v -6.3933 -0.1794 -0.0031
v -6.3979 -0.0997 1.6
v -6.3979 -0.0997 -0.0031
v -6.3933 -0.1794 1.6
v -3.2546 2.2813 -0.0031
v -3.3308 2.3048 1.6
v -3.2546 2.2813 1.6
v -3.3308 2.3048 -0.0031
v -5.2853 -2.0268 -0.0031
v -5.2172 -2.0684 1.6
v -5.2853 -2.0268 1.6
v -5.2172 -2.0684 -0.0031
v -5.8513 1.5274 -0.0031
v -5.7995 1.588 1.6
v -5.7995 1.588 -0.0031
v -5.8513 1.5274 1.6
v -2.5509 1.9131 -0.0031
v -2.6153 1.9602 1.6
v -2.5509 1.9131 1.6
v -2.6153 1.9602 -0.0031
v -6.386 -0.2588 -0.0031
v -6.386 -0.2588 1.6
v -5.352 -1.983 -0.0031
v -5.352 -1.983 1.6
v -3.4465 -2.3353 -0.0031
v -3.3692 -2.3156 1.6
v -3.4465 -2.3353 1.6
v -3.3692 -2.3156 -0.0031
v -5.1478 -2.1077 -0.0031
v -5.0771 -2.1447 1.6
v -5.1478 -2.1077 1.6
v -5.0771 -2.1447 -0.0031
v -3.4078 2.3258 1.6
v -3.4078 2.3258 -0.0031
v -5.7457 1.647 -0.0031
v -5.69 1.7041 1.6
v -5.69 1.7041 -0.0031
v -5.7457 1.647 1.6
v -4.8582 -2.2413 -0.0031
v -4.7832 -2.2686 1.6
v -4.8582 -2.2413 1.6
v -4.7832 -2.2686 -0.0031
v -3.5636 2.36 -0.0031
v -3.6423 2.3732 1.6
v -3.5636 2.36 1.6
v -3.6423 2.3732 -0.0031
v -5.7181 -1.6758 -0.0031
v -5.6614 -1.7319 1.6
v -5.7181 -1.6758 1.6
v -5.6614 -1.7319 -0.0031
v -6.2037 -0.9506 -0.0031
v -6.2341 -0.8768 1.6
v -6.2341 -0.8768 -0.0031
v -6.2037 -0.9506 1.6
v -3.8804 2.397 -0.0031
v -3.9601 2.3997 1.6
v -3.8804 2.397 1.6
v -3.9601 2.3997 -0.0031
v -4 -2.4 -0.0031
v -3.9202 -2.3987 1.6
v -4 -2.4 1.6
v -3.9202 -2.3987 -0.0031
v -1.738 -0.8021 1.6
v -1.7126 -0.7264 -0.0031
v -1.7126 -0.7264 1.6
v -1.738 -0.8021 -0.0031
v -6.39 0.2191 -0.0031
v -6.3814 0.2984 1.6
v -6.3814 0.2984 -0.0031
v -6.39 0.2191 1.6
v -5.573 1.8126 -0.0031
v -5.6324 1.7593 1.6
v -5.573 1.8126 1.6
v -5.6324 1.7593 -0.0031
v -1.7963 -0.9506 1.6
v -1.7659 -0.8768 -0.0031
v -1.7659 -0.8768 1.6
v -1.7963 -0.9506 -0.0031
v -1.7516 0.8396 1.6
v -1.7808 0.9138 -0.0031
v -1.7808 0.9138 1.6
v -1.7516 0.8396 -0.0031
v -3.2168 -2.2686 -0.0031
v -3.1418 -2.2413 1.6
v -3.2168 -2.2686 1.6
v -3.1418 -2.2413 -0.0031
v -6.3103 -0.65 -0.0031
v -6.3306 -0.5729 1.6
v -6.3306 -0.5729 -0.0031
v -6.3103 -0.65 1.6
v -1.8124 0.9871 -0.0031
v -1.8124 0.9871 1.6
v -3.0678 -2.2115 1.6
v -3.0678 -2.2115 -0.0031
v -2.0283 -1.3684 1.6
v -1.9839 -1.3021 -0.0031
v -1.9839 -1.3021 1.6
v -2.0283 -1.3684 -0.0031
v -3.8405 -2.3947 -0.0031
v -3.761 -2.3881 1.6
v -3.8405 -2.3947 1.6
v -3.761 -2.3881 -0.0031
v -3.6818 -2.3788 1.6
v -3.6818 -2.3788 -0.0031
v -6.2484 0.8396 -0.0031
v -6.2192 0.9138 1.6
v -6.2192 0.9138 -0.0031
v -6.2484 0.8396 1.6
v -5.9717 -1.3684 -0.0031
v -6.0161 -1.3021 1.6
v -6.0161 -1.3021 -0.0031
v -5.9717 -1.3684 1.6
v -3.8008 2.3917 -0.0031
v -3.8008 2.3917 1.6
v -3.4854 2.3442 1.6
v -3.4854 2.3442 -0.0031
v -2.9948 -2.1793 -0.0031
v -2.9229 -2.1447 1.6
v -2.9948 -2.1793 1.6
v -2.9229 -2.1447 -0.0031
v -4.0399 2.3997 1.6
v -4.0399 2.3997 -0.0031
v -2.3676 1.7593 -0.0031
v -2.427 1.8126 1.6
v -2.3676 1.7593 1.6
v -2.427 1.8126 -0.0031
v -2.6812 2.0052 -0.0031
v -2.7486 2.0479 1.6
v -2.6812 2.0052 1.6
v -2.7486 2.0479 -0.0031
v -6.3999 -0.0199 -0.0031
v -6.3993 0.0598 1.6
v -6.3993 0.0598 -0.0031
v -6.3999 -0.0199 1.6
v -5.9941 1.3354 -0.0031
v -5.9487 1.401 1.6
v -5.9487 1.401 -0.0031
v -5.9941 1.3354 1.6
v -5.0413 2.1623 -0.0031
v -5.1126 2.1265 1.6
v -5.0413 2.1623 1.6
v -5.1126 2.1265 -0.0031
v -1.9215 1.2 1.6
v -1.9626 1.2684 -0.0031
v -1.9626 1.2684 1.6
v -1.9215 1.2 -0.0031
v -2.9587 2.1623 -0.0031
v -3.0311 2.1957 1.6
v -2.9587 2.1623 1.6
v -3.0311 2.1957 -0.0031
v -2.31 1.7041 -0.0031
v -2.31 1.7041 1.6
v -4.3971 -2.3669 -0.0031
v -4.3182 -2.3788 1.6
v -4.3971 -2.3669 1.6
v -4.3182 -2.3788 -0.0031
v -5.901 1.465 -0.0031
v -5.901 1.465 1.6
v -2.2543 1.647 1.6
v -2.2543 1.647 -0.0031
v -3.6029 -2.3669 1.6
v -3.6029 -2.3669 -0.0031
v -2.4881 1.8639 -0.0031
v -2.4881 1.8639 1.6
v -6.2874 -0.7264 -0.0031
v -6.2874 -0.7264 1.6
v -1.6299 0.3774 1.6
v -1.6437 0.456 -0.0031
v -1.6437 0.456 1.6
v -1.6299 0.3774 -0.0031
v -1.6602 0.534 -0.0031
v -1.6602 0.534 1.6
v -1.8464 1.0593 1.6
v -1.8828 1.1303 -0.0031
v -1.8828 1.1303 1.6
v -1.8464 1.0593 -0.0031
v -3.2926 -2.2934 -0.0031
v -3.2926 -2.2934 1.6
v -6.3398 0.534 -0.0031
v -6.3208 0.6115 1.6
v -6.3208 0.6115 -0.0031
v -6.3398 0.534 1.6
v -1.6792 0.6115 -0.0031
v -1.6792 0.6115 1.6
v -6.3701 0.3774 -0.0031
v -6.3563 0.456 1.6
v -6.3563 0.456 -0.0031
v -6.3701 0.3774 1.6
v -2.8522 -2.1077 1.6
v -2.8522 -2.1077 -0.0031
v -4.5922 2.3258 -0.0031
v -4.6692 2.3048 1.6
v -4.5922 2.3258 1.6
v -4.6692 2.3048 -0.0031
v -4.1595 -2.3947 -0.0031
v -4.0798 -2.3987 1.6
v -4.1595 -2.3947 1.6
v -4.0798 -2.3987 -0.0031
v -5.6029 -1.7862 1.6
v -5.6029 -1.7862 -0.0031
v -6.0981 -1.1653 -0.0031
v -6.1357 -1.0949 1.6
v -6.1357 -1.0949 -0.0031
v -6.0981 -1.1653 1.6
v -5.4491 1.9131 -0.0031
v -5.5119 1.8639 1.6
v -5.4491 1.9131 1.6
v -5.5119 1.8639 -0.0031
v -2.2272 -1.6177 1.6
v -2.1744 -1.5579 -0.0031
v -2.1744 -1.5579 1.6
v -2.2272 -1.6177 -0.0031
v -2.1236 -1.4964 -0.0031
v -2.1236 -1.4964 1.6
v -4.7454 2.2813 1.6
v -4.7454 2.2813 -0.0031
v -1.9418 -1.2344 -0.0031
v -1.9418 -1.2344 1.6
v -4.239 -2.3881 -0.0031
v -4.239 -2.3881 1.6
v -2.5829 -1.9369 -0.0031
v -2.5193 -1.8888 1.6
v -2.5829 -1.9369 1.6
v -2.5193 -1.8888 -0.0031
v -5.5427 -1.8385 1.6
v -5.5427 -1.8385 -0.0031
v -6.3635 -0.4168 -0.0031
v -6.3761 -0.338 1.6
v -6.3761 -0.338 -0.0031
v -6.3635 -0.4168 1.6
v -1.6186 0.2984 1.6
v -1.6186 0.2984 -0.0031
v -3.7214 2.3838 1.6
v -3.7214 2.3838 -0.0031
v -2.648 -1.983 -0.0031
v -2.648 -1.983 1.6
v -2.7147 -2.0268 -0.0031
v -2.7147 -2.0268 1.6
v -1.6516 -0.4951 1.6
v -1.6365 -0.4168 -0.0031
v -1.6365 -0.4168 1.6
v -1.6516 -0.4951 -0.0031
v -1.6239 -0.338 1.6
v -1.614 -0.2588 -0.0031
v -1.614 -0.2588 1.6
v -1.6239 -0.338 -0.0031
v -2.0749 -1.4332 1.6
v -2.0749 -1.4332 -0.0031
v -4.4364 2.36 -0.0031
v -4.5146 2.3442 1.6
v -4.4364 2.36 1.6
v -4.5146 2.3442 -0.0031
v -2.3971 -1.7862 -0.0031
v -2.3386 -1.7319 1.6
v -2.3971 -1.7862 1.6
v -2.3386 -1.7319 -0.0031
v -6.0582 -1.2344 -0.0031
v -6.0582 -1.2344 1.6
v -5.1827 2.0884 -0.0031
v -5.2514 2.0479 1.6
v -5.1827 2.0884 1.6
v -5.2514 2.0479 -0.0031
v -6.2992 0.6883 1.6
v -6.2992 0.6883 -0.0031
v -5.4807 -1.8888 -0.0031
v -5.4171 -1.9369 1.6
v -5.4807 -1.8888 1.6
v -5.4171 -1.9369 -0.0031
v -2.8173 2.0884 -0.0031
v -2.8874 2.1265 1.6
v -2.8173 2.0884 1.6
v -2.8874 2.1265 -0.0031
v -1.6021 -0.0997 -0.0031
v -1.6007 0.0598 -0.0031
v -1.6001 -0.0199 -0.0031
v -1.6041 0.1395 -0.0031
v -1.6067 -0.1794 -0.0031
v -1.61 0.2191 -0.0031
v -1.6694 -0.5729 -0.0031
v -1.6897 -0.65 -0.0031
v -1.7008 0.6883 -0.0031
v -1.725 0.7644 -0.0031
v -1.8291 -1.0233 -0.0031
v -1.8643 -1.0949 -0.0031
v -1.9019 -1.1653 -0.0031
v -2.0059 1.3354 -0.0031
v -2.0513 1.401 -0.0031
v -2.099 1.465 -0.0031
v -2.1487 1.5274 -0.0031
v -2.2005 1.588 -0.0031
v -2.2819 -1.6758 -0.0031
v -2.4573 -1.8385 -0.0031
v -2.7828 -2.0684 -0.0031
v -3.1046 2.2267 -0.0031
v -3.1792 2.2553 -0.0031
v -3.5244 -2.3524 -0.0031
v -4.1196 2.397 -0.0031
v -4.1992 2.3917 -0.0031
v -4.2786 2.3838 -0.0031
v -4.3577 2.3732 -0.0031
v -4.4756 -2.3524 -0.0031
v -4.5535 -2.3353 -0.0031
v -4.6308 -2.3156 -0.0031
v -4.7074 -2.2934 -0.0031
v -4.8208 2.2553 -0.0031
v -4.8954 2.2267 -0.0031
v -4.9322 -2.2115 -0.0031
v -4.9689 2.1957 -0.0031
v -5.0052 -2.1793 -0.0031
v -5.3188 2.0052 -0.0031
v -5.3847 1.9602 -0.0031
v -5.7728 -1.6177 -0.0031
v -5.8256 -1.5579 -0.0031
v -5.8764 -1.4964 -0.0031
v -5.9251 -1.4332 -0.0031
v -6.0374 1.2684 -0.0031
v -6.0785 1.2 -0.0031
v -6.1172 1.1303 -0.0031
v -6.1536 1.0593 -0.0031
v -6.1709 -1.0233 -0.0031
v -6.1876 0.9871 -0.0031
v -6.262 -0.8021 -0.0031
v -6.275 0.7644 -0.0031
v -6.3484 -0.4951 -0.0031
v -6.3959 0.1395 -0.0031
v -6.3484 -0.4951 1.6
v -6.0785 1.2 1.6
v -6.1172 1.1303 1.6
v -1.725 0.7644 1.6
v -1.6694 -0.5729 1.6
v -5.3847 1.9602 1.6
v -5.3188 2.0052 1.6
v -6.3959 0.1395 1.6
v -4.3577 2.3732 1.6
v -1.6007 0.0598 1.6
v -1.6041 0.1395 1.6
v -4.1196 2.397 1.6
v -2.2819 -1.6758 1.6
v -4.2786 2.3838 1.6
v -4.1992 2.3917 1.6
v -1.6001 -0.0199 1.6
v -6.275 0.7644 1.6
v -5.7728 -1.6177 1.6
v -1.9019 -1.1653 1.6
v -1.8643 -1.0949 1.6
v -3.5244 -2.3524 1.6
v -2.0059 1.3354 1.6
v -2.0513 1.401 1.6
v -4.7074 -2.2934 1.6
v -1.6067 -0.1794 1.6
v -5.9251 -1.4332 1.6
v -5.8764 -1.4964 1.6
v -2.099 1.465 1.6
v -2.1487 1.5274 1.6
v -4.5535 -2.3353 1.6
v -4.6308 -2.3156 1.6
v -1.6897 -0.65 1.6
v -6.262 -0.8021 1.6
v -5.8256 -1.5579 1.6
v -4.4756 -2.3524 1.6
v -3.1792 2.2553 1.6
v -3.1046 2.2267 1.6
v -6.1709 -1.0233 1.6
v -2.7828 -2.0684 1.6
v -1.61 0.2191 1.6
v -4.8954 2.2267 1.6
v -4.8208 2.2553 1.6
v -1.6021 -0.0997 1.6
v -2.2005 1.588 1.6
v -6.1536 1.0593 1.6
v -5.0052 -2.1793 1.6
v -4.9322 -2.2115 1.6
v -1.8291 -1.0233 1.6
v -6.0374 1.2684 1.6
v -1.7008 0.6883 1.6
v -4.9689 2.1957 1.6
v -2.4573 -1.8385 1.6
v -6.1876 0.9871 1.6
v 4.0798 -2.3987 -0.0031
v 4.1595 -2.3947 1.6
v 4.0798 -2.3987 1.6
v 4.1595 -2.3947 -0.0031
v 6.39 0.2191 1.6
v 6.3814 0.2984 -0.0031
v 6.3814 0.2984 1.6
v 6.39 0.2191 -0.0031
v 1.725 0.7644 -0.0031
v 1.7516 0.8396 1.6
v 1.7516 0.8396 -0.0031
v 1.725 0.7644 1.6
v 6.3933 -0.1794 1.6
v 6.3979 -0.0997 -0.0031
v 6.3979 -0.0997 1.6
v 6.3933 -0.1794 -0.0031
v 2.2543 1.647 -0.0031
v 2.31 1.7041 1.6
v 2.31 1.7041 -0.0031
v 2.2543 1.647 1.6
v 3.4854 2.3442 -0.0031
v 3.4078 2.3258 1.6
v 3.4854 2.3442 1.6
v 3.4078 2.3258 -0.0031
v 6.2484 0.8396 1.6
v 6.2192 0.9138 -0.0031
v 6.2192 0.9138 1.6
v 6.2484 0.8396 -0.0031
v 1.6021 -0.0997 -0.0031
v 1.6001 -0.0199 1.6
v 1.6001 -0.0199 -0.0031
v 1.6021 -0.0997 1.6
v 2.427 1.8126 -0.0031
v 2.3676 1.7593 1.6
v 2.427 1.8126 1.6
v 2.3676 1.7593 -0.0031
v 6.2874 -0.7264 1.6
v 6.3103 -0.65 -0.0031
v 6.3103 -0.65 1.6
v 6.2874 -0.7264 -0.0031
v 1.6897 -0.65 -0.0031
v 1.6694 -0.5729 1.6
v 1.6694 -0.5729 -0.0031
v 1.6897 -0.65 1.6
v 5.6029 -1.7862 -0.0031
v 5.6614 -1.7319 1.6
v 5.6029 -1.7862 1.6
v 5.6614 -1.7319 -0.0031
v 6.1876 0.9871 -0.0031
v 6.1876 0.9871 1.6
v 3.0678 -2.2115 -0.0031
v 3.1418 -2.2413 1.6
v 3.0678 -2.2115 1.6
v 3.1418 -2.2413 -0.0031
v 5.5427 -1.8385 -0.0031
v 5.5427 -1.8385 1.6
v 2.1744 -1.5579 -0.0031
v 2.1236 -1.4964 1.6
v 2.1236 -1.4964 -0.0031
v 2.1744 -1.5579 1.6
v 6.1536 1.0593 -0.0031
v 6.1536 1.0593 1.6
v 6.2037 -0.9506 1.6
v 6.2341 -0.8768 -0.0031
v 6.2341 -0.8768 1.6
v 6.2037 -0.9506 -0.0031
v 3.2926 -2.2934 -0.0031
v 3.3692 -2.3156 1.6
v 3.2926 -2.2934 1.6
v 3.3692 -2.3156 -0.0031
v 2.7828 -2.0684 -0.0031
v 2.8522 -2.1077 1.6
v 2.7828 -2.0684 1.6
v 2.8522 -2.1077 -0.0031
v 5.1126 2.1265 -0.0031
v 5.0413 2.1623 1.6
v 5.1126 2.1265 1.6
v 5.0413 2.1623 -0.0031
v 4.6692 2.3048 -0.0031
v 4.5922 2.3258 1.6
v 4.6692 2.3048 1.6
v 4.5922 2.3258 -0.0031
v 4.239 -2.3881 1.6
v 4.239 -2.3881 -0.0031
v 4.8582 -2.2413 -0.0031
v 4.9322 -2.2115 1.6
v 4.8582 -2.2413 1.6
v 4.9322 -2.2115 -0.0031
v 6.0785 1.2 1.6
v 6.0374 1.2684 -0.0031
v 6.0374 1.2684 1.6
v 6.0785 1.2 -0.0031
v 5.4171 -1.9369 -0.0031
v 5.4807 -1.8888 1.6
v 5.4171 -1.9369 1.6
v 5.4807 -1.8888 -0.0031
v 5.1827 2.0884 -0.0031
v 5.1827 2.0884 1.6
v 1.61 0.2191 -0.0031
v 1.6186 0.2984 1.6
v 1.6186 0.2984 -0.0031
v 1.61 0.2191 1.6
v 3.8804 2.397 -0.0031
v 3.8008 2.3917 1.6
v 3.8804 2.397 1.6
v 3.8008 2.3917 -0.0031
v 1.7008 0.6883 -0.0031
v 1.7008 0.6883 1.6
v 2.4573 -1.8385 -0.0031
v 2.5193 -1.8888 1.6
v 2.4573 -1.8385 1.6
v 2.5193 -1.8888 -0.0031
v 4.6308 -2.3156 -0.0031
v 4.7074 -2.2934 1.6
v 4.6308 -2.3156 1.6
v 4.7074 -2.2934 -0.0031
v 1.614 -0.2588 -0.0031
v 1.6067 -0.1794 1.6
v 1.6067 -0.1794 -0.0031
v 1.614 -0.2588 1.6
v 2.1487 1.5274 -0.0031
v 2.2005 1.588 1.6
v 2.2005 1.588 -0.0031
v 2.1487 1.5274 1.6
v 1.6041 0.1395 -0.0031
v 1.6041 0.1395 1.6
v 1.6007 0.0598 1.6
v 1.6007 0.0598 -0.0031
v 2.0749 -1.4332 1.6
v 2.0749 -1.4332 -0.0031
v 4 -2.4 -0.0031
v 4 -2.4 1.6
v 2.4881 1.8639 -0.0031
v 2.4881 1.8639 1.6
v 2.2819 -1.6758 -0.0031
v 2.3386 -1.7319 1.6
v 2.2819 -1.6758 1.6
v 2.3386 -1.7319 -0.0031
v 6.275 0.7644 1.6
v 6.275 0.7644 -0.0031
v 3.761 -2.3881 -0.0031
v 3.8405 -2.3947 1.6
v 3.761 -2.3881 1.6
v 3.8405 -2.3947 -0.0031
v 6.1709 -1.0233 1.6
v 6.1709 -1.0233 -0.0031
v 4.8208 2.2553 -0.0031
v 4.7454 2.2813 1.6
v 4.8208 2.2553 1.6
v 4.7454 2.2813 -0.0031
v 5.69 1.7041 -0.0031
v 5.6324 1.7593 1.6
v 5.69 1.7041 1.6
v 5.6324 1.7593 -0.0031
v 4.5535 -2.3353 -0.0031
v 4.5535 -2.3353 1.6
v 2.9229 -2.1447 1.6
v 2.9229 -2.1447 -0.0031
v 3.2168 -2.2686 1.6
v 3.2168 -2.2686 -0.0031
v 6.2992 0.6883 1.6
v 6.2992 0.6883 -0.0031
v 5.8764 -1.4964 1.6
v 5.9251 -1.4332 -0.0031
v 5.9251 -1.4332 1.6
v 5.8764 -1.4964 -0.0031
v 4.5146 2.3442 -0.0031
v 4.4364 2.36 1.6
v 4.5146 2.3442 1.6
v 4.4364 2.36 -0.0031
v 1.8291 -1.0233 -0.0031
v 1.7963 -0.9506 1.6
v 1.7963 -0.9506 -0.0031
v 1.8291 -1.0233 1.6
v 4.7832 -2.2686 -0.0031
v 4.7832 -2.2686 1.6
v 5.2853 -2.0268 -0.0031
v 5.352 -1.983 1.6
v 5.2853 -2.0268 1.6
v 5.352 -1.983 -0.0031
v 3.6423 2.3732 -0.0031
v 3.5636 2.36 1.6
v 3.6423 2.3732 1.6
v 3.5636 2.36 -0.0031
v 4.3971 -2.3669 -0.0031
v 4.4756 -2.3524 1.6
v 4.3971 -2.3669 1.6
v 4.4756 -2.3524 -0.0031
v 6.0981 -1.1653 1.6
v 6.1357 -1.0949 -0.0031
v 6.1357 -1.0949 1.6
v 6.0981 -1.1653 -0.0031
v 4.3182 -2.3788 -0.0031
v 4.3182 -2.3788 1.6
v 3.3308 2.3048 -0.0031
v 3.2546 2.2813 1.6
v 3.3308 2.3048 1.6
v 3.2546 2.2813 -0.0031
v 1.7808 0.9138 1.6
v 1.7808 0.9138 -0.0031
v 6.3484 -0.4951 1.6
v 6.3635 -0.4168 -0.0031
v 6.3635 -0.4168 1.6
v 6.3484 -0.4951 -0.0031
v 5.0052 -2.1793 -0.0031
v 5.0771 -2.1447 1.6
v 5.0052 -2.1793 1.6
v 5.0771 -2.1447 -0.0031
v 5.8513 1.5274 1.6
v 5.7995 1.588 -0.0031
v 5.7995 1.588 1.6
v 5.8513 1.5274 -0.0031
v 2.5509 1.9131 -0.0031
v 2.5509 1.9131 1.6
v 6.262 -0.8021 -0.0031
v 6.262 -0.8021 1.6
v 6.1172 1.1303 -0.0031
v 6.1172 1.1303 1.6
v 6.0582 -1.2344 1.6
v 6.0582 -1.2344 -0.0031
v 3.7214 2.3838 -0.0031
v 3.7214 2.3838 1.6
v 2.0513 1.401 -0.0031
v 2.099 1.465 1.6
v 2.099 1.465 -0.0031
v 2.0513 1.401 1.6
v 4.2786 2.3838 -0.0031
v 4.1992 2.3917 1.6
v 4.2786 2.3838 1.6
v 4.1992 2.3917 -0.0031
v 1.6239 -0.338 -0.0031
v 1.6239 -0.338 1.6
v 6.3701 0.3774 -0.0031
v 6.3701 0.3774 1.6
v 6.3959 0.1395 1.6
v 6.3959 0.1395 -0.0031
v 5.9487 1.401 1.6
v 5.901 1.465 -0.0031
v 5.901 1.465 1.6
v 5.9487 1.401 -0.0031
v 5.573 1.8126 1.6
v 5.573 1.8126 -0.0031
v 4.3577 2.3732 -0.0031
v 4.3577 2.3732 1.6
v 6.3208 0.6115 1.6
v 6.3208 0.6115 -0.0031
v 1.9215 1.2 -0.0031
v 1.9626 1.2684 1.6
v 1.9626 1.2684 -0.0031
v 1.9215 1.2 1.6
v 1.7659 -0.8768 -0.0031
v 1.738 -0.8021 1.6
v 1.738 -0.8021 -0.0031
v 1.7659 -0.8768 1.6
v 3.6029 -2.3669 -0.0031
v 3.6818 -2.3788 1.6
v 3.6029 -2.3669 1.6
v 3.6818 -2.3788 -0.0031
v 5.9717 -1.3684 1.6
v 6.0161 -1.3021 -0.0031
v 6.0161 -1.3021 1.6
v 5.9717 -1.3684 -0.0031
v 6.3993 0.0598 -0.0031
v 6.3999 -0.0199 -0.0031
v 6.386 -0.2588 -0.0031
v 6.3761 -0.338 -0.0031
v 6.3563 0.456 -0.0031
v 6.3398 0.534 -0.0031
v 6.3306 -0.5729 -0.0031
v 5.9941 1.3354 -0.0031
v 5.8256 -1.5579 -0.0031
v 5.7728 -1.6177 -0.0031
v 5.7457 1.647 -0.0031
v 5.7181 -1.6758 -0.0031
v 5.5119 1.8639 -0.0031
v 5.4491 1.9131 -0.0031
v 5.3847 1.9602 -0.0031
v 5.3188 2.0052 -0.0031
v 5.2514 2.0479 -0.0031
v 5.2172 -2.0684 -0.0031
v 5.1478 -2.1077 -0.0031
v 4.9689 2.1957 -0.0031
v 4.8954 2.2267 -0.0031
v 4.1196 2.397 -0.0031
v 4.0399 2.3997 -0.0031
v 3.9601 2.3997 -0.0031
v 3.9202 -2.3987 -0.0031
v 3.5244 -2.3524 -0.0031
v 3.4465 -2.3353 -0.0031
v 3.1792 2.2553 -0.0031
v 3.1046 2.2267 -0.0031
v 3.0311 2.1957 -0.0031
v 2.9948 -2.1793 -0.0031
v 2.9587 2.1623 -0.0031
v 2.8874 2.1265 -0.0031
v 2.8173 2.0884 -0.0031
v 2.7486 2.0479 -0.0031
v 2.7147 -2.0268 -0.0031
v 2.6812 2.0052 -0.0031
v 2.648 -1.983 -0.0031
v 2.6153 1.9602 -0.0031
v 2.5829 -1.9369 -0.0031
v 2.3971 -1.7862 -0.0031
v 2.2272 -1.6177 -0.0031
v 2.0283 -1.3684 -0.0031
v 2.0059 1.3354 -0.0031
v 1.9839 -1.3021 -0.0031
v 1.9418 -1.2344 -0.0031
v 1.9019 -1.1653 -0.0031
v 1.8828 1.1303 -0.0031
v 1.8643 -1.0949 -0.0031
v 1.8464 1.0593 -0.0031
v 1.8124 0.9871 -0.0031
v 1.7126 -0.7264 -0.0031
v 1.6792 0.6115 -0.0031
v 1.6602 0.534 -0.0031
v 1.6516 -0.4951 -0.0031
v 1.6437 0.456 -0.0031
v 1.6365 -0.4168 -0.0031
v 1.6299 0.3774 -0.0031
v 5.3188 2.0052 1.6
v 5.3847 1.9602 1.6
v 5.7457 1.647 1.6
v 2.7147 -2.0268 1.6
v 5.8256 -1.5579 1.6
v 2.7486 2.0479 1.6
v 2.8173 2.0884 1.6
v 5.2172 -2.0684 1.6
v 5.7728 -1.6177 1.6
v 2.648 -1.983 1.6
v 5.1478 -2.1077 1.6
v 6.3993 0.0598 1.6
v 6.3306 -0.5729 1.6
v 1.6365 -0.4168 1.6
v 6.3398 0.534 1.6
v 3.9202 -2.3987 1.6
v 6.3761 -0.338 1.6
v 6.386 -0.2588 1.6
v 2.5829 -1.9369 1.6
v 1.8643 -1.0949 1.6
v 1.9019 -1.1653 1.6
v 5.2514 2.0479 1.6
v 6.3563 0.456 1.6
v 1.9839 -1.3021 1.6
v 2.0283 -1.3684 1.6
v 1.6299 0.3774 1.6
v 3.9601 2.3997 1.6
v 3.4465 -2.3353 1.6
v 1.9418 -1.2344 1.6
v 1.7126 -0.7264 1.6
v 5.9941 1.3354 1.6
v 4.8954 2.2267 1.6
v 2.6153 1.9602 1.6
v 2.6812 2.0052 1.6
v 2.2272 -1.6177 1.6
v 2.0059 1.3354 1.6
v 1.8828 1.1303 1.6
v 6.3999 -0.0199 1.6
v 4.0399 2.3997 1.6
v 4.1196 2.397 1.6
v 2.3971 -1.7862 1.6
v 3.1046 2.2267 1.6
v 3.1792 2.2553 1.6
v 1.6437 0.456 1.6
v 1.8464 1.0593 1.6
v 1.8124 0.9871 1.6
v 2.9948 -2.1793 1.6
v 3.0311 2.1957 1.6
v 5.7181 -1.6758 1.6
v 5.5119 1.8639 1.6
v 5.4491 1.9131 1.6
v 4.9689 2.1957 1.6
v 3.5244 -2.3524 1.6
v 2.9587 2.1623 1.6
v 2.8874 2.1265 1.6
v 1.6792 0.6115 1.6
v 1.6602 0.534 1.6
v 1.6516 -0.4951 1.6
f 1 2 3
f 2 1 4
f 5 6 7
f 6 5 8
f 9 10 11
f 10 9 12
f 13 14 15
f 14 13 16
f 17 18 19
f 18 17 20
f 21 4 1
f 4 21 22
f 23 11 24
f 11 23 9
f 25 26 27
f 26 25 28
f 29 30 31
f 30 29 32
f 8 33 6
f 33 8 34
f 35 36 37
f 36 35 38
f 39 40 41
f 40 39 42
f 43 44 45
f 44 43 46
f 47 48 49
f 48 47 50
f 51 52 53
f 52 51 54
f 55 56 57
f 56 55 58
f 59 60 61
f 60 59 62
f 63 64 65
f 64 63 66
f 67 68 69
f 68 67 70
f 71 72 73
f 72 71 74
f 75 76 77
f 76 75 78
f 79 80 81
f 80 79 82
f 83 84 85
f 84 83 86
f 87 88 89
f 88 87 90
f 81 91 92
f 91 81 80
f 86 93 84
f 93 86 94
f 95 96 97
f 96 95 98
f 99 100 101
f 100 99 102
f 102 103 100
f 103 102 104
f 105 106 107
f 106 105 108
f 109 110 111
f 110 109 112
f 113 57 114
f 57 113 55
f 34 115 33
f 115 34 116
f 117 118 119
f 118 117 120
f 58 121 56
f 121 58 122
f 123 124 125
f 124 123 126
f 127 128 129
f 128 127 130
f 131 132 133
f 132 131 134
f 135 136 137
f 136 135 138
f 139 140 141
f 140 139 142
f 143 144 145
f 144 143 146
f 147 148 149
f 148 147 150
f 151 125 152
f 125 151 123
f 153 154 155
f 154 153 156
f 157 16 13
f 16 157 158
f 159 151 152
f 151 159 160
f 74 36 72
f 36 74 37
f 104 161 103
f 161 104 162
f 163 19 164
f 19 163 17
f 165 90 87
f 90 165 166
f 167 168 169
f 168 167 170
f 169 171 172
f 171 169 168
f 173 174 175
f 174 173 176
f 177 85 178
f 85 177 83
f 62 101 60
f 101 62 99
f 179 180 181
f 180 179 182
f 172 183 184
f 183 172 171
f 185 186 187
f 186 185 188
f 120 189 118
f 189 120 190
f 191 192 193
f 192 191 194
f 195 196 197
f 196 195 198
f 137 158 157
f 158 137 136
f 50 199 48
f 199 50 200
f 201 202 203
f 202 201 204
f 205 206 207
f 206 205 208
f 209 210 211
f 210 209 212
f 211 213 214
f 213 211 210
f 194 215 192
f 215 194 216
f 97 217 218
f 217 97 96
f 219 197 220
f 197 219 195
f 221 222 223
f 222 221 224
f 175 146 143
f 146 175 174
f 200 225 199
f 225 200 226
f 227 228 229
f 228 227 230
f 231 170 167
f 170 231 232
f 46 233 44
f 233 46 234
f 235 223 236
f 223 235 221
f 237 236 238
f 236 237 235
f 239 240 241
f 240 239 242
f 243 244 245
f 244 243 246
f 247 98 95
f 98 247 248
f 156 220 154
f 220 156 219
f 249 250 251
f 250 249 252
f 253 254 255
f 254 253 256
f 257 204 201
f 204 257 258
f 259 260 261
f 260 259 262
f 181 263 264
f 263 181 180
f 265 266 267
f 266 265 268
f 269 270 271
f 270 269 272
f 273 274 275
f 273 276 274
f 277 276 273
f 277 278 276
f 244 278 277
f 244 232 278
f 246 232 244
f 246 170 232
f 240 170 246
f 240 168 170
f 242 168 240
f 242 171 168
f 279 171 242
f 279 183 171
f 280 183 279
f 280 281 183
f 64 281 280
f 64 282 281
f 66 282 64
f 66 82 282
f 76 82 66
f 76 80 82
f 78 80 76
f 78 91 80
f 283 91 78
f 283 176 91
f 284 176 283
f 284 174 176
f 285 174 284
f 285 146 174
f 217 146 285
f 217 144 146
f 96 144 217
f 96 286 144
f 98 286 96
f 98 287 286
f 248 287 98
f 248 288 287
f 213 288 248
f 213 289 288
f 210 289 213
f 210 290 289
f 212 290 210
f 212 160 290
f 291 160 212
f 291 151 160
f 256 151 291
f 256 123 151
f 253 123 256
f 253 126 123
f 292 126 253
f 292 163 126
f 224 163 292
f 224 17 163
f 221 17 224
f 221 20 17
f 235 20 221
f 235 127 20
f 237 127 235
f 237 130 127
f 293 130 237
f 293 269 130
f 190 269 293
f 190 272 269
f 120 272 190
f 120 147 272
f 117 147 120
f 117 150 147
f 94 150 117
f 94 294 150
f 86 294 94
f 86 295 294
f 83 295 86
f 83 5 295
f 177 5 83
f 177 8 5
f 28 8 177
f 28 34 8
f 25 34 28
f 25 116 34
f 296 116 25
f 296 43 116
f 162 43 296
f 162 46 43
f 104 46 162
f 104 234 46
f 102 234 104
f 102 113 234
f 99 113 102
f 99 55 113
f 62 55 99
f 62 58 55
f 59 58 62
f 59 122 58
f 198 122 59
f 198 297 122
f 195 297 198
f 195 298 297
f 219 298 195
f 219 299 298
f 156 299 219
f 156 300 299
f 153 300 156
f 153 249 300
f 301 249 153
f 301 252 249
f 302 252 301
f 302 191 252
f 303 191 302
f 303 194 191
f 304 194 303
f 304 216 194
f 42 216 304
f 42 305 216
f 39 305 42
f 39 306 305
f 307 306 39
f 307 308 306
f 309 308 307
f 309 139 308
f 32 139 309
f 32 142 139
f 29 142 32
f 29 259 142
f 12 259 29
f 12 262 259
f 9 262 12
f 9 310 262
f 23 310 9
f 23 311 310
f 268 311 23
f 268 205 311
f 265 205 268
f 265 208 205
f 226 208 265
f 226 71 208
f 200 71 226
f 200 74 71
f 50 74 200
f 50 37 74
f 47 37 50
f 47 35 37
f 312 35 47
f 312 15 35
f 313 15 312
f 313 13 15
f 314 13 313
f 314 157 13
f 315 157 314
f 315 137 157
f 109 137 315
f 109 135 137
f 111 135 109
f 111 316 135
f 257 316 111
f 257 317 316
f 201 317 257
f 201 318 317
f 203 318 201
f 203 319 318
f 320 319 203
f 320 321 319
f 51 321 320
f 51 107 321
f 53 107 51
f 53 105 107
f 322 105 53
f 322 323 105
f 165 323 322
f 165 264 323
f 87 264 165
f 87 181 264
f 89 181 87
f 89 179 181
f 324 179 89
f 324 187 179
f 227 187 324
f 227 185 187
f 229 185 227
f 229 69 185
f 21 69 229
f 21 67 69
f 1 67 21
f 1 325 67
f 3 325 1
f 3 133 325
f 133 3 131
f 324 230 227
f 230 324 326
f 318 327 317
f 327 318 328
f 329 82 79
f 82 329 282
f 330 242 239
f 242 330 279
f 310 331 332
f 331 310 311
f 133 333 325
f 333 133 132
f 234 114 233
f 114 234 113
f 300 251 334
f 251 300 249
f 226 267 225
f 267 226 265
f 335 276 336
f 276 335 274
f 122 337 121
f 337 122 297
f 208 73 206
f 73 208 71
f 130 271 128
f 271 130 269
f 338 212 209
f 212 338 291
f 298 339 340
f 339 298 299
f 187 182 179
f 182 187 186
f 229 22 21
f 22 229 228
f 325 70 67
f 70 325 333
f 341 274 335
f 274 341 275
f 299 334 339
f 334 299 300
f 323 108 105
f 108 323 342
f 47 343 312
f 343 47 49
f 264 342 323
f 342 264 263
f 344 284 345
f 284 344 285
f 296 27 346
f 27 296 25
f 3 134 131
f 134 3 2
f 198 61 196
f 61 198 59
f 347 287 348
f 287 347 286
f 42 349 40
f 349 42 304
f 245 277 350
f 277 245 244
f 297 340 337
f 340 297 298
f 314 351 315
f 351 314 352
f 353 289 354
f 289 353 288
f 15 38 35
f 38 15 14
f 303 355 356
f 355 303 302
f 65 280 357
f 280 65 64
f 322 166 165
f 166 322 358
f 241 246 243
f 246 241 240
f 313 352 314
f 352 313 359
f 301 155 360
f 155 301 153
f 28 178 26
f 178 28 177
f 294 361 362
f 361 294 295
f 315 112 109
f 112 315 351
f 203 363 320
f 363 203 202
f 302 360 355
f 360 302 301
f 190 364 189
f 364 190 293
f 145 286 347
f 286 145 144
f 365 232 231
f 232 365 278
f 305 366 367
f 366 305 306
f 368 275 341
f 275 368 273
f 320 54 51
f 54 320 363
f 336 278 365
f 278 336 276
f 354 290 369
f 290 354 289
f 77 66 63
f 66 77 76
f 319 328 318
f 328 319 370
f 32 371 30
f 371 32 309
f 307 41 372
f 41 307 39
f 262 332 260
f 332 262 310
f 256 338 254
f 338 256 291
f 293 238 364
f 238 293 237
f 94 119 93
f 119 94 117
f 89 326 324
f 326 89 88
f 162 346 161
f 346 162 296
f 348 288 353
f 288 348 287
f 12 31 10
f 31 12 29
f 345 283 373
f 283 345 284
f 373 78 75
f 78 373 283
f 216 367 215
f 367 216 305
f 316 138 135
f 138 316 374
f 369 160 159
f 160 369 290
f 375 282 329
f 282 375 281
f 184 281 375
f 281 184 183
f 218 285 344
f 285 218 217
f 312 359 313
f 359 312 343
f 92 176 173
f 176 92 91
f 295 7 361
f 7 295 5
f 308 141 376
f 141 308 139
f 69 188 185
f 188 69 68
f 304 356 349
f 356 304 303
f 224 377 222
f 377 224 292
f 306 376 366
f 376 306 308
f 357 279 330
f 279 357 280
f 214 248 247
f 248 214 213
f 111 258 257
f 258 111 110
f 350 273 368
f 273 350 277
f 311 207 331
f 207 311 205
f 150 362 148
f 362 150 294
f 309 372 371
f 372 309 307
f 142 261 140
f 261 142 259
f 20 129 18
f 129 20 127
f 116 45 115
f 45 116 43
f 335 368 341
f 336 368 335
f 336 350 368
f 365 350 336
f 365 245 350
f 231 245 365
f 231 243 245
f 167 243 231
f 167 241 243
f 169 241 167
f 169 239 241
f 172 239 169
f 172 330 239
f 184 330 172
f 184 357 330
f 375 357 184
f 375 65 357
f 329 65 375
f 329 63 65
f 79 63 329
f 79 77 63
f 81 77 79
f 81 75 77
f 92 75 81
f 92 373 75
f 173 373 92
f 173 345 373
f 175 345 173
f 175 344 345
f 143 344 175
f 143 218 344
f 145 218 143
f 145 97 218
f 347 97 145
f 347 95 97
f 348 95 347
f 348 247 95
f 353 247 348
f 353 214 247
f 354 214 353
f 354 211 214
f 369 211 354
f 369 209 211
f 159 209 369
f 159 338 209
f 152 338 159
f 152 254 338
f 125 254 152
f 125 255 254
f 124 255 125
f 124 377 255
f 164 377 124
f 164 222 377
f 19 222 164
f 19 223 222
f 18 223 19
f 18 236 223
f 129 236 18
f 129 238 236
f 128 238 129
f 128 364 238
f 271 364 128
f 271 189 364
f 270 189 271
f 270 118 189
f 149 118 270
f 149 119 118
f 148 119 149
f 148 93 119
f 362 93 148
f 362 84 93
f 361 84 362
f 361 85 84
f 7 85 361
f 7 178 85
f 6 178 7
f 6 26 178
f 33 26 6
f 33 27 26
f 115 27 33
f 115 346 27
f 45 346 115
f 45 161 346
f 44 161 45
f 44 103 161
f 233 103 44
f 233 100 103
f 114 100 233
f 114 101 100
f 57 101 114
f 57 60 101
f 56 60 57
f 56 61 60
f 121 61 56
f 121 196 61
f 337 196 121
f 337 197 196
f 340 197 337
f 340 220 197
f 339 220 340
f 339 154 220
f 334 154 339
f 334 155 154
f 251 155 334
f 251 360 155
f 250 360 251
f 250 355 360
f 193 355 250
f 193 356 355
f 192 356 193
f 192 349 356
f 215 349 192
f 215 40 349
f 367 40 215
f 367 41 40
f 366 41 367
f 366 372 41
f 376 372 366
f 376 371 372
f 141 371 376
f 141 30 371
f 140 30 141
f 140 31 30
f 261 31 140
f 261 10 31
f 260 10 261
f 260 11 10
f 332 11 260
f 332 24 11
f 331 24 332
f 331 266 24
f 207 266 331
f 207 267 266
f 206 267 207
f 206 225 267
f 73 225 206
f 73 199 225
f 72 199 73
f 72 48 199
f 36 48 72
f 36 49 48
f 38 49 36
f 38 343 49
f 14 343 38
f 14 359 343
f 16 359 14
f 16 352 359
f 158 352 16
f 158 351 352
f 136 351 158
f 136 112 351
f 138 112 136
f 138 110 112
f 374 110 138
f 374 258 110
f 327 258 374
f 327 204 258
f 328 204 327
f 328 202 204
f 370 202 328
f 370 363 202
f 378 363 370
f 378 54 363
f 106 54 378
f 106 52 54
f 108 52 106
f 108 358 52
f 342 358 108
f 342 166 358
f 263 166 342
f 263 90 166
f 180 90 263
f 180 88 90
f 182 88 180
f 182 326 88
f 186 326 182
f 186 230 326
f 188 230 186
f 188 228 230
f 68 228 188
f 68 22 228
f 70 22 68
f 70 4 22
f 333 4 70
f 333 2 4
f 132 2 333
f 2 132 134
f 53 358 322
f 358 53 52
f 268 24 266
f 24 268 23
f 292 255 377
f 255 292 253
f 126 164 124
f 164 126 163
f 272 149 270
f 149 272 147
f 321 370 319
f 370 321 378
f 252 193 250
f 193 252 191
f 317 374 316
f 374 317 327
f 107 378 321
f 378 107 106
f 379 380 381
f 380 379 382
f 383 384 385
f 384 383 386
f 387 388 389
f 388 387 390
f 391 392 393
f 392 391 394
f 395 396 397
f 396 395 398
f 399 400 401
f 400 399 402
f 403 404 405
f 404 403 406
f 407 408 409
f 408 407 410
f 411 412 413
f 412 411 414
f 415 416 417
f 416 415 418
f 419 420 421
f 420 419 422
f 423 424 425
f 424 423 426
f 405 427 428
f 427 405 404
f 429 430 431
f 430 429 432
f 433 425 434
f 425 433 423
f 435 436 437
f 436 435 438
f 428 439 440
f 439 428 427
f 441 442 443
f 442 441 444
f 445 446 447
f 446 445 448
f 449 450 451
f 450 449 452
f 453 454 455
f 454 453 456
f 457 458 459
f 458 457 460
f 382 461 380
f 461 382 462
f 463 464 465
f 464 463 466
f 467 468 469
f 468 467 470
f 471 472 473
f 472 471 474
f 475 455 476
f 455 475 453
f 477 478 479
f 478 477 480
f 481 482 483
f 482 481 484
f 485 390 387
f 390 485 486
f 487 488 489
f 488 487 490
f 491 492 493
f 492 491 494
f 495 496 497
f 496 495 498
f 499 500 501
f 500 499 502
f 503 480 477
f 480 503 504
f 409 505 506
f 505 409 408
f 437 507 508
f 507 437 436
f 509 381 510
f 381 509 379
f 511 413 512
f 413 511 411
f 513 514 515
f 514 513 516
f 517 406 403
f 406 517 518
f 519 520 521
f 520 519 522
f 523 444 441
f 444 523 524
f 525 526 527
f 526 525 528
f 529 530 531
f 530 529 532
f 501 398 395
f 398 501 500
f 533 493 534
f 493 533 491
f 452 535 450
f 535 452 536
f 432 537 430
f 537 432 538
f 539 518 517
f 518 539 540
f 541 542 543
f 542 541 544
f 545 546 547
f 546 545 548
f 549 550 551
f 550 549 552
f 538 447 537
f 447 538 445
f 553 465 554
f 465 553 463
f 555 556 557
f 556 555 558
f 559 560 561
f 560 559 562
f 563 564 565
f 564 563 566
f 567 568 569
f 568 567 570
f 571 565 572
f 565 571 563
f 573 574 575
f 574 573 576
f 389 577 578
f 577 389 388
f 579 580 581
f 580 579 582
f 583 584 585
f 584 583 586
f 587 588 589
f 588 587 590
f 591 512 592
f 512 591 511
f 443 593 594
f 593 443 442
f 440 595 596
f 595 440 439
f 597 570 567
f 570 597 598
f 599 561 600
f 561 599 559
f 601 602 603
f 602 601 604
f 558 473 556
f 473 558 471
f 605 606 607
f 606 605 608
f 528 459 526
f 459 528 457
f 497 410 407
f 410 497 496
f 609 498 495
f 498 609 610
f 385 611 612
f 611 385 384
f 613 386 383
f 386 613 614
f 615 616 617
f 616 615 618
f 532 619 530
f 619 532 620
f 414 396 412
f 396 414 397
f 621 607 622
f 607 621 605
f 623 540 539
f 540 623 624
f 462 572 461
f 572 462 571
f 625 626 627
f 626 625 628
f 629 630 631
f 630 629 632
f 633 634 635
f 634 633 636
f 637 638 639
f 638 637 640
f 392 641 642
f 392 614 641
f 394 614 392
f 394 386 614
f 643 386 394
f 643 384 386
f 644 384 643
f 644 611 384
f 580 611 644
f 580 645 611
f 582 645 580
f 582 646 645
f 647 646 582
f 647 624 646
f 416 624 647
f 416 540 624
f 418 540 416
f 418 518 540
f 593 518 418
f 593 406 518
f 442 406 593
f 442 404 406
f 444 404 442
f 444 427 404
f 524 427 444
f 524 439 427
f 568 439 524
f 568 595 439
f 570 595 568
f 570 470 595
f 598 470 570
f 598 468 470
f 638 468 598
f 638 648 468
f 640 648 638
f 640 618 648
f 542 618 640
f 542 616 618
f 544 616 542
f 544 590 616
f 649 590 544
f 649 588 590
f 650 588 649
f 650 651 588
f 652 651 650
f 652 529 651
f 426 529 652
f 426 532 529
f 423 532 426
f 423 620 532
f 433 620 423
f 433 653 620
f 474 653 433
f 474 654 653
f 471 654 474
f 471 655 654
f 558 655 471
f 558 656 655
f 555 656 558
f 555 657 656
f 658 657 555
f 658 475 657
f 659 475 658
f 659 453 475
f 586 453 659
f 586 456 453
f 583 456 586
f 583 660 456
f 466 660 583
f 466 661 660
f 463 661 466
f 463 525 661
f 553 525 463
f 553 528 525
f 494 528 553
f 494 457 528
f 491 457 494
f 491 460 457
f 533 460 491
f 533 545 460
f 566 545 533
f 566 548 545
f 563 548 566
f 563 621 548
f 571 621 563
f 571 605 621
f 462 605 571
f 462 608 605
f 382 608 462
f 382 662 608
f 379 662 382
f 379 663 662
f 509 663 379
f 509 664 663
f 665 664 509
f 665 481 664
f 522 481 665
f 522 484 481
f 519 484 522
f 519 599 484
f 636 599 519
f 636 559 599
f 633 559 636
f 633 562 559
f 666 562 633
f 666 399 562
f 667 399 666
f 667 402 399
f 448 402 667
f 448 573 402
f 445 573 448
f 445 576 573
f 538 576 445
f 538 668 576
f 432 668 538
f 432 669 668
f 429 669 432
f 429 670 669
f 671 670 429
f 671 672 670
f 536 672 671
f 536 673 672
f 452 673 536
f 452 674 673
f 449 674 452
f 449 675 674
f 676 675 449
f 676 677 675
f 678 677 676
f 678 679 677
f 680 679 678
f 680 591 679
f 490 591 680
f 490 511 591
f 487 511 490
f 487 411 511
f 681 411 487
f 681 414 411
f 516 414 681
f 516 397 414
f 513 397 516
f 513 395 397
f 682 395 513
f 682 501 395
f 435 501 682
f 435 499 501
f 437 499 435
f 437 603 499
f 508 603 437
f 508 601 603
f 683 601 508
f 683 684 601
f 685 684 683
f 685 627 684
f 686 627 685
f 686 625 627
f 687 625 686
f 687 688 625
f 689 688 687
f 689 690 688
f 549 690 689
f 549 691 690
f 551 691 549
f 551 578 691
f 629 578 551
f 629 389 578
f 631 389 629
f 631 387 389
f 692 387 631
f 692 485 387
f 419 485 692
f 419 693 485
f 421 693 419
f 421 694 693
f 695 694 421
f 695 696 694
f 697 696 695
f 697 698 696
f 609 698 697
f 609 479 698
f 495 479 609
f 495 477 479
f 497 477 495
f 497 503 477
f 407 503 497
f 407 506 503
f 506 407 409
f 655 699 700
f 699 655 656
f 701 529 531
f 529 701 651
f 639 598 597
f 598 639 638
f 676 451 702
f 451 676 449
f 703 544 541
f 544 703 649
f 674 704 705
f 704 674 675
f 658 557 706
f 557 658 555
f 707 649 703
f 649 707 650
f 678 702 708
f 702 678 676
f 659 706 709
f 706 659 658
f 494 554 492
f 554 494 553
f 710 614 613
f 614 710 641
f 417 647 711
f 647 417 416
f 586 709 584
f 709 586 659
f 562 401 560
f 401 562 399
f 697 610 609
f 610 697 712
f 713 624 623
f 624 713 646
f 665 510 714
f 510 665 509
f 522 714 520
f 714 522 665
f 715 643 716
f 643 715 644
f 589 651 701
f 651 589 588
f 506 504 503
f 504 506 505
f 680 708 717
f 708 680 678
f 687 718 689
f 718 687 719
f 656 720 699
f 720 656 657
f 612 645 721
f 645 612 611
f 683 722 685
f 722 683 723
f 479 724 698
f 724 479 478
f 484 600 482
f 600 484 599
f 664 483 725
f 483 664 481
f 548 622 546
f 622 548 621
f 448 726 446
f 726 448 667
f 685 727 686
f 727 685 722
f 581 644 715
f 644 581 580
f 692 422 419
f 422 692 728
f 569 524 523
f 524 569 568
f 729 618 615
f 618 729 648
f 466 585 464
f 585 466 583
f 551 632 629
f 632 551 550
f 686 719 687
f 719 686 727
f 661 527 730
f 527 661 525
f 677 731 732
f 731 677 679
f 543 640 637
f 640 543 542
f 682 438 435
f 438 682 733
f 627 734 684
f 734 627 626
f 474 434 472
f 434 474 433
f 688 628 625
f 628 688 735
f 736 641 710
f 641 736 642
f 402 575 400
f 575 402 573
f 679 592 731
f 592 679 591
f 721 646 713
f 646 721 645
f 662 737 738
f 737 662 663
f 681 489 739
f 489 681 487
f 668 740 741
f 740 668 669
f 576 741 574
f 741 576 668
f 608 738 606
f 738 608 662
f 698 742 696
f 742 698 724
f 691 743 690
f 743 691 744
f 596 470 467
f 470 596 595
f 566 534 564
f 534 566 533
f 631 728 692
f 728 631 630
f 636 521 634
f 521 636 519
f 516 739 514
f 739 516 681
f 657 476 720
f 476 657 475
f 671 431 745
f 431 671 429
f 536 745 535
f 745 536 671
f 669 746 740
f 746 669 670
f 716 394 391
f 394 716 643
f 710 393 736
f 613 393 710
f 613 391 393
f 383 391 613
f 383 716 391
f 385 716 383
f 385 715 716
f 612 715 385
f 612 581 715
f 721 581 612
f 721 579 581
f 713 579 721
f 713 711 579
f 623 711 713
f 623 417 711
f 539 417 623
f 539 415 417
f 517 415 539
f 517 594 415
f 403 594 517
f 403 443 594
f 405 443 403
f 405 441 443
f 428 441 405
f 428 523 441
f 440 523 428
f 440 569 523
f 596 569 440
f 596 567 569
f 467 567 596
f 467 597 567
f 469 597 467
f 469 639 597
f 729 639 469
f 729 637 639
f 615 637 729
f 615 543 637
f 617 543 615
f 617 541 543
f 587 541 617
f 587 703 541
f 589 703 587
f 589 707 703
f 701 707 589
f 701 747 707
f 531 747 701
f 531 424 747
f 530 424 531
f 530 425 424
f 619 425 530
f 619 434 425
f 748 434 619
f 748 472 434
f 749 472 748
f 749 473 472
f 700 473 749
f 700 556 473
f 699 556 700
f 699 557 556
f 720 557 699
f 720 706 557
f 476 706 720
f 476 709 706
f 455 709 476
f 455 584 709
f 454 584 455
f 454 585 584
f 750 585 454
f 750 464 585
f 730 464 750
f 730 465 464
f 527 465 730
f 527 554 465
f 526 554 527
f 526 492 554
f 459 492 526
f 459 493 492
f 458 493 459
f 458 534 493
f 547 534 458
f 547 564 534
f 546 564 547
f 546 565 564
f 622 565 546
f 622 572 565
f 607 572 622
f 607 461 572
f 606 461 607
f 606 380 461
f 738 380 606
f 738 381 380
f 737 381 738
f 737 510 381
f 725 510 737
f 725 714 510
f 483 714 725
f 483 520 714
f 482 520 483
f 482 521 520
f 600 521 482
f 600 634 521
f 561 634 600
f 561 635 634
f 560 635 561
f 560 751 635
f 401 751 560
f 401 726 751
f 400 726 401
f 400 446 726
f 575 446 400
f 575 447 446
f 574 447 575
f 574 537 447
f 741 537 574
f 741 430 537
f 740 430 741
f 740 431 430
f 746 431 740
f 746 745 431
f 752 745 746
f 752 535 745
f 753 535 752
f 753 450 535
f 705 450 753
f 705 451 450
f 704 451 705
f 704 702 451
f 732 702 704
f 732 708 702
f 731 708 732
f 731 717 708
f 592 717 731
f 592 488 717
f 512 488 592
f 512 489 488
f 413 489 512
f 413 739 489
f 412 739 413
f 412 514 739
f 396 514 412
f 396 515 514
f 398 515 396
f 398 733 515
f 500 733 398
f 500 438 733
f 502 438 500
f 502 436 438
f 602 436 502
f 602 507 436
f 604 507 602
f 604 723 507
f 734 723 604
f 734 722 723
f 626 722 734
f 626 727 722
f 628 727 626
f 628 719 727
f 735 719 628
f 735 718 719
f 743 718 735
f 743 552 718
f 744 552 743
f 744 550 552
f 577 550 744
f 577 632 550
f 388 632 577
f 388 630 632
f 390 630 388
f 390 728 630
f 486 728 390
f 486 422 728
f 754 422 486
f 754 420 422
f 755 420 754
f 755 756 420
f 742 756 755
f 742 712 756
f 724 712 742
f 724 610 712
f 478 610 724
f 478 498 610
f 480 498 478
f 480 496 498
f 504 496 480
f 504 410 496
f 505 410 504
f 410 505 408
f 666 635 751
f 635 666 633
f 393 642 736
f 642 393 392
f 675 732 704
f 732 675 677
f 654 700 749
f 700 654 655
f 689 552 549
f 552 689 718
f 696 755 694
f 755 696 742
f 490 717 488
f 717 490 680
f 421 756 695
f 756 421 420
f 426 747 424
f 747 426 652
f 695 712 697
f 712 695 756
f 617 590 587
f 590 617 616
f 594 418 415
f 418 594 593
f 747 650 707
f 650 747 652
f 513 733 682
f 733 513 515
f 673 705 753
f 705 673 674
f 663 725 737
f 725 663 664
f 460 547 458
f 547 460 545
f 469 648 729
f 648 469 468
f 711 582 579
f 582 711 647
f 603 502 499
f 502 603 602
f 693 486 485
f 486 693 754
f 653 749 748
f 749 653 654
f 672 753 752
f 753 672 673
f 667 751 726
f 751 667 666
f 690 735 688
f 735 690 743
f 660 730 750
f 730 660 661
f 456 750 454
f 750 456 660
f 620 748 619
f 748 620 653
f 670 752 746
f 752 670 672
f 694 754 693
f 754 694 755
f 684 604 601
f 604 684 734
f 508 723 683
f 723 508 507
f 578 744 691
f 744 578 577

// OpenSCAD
use <../lib.scad>
use <../p/1-4disc.scad>
use <../p/1-4ndis.scad>
use <../p/2-4disc.scad>
use <../p/2-4ndis.scad>
use <s/3039s01.scad>
$fa=1; $fs=0.2;
function ldraw_lib__3039p12(realsolid=false) = [
// 0 Slope Brick 45  2 x  2 with White Phone Pattern
// 0 Name: 3039p12.dat
// 0 Author: John Riley [jriley]
// 0 !LDRAW_ORG Part UPDATE 2004-02
// 0 !LICENSE Licensed under CC BY 2.0 and CC BY 4.0 : see CAreadme.txt
// 
// 0 BFC CERTIFY CCW
  [0,"BFC","CERTIFY"],
  [0,"BFC","CCW"],
// 
// 0 !KEYWORDS 12 key pad, buttons, handset, telephone, town
// 
// 0 !HISTORY 2003-07-06 [Steffen] fixed BFC errors, fixed numeric precision glitches, adjusted header to comply with standard
// 0 !HISTORY 2004-04-22 [PTadmin] Official Update 2004-02
// 0 !HISTORY 2007-06-09 [PTadmin] Header formatted for Contributor Agreement
// 0 !HISTORY 2008-07-01 [PTadmin] Official Update 2008-01
// 
// 
// 1 16 0 0 0 1 0 0 0 1 0 0 0 1 s\3039s01.dat
  [1,16,0,0,0,1,0,0,0,1,0,0,0,1, ldraw_lib__s__3039s01(realsolid)],
// 4 16 2 20 -30 20 20 -30 20 17.6777 -27.6777 2 17.6777 -27.6777
  [4,16,2,20,-30,20,20,-30,20,17.6777,-27.6777,2,17.6777,-27.6777],
// 4 16 2 15.5563 -25.5563 20 15.5563 -25.5563 20 13.435 -23.435 2 13.435 -23.435
  [4,16,2,15.5563,-25.5563,20,15.5563,-25.5563,20,13.435,-23.435,2,13.435,-23.435],
// 4 16 2 11.3137 -21.3137 20 11.3137 -21.3137 20 9.19239 -19.1924 2 9.19239 -19.1924
  [4,16,2,11.3137,-21.3137,20,11.3137,-21.3137,20,9.19239,-19.1924,2,9.19239,-19.1924],
// 4 16 2 7.07107 -17.0711 20 7.07107 -17.0711 20 4.94975 -14.9497 2 4.94975 -14.9497
  [4,16,2,7.07107,-17.0711,20,7.07107,-17.0711,20,4.94975,-14.9497,2,4.94975,-14.9497],
// 4 16 2 2.82843 -12.8284 20 2.82843 -12.8284 20 0 -10 2 0 -10
  [4,16,2,2.82843,-12.8284,20,2.82843,-12.8284,20,0,-10,2,0,-10],
// 4 16 17 20 -30 20 20 -30 20 0 -10 17 0 -10
  [4,16,17,20,-30,20,20,-30,20,0,-10,17,0,-10],
// 4 16 11 20 -30 14 20 -30 14 0 -10 11 0 -10
  [4,16,11,20,-30,14,20,-30,14,0,-10,11,0,-10],
// 4 16 5 20 -30 8 20 -30 8 0 -10 5 0 -10
  [4,16,5,20,-30,8,20,-30,8,0,-10,5,0,-10],
// 4 16 -5 20 -30 2 20 -30 2 0 -10 -5 0 -10
  [4,16,-5,20,-30,2,20,-30,2,0,-10,-5,0,-10],
// 4 15 14 7.07107 -17.0711 14 9.19239 -19.1924 17 9.19239 -19.1924 17 7.07107 -17.0711
  [4,15,14,7.07107,-17.0711,14,9.19239,-19.1924,17,9.19239,-19.1924,17,7.07107,-17.0711],
// 4 15 2 2.82843 -12.8284 2 4.94975 -14.9497 5 4.94975 -14.9497 5 2.82843 -12.8284
  [4,15,2,2.82843,-12.8284,2,4.94975,-14.9497,5,4.94975,-14.9497,5,2.82843,-12.8284],
// 4 15 8 2.82843 -12.8284 8 4.94975 -14.9497 11 4.94975 -14.9497 11 2.82843 -12.8284
  [4,15,8,2.82843,-12.8284,8,4.94975,-14.9497,11,4.94975,-14.9497,11,2.82843,-12.8284],
// 4 15 14 2.82843 -12.8284 14 4.94975 -14.9497 17 4.94975 -14.9497 17 2.82843 -12.8284
  [4,15,14,2.82843,-12.8284,14,4.94975,-14.9497,17,4.94975,-14.9497,17,2.82843,-12.8284],
// 4 15 2 7.07107 -17.0711 2 9.19239 -19.1924 5 9.19239 -19.1924 5 7.07107 -17.0711
  [4,15,2,7.07107,-17.0711,2,9.19239,-19.1924,5,9.19239,-19.1924,5,7.07107,-17.0711],
// 4 15 8 7.07107 -17.0711 8 9.19239 -19.1924 11 9.19239 -19.1924 11 7.07107 -17.0711
  [4,15,8,7.07107,-17.0711,8,9.19239,-19.1924,11,9.19239,-19.1924,11,7.07107,-17.0711],
// 4 15 14 15.5563 -25.5563 14 17.6777 -27.6777 17 17.6777 -27.6777 17 15.5563 -25.5563
  [4,15,14,15.5563,-25.5563,14,17.6777,-27.6777,17,17.6777,-27.6777,17,15.5563,-25.5563],
// 4 15 2 11.3137 -21.3137 2 13.435 -23.435 5 13.435 -23.435 5 11.3137 -21.3137
  [4,15,2,11.3137,-21.3137,2,13.435,-23.435,5,13.435,-23.435,5,11.3137,-21.3137],
// 4 15 8 11.3137 -21.3137 8 13.435 -23.435 11 13.435 -23.435 11 11.3137 -21.3137
  [4,15,8,11.3137,-21.3137,8,13.435,-23.435,11,13.435,-23.435,11,11.3137,-21.3137],
// 4 15 14 11.3137 -21.3137 14 13.435 -23.435 17 13.435 -23.435 17 11.3137 -21.3137
  [4,15,14,11.3137,-21.3137,14,13.435,-23.435,17,13.435,-23.435,17,11.3137,-21.3137],
// 4 15 2 15.5563 -25.5563 2 17.6777 -27.6777 5 17.6777 -27.6777 5 15.5563 -25.5563
  [4,15,2,15.5563,-25.5563,2,17.6777,-27.6777,5,17.6777,-27.6777,5,15.5563,-25.5563],
// 4 15 8 15.5563 -25.5563 8 17.6777 -27.6777 11 17.6777 -27.6777 11 15.5563 -25.5563
  [4,15,8,15.5563,-25.5563,8,17.6777,-27.6777,11,17.6777,-27.6777,11,15.5563,-25.5563],
// 1 15 -12 9.899 -19.899 0 0 -5 -8.48528 0.707107 0 8.48528 0.707107 0 2-4disc.dat
  [1,15,-12,9.899,-19.899,0,0,-5,-8.48528,0.707107,0,8.48528,0.707107,0, ldraw_lib__2_4disc(realsolid)],
// 1 16 -12 9.899 -19.899 0 0 -5 8.48528 0.707107 0 -8.48528 0.707107 0 2-4ndis.dat
  [1,16,-12,9.899,-19.899,0,0,-5,8.48528,0.707107,0,-8.48528,0.707107,0, ldraw_lib__2_4ndis(realsolid)],
// 4 16 -20 0 -10 -20 1.41421 -11.4142 -10 1.41421 -11.4142 -10 0 -10
  [4,16,-20,0,-10,-20,1.41421,-11.4142,-10,1.41421,-11.4142,-10,0,-10],
// 4 16 -20 18.3848 -28.3848 -20 20 -30 -10 20 -30 -10 18.3848 -28.3848
  [4,16,-20,18.3848,-28.3848,-20,20,-30,-10,20,-30,-10,18.3848,-28.3848],
// 4 16 -20 1.41421 -11.4142 -20 18.3848 -28.3848 -17 18.3848 -28.3848 -17 1.41421 -11.4142
  [4,16,-20,1.41421,-11.4142,-20,18.3848,-28.3848,-17,18.3848,-28.3848,-17,1.41421,-11.4142],
// 1 16 -11 9.899 -19.899 0 0 -1 -4.24264 0.707107 0 4.24264 0.707107 0 2-4disc.dat
  [1,16,-11,9.899,-19.899,0,0,-1,-4.24264,0.707107,0,4.24264,0.707107,0, ldraw_lib__2_4disc(realsolid)],
// 1 15 -11 9.899 -19.899 0 0 -1 4.24264 0.707107 0 -4.24264 0.707107 0 2-4ndis.dat
  [1,15,-11,9.899,-19.899,0,0,-1,4.24264,0.707107,0,-4.24264,0.707107,0, ldraw_lib__2_4ndis(realsolid)],
// 4 15 -10 1.41421 -11.4142 -12 1.41421 -11.4142 -12 5.65685 -15.6569 -10 5.65685 -15.6569
  [4,15,-10,1.41421,-11.4142,-12,1.41421,-11.4142,-12,5.65685,-15.6569,-10,5.65685,-15.6569],
// 4 15 -10 14.1421 -24.1421 -12 14.1421 -24.1421 -12 18.3848 -28.3848 -10 18.3848 -28.3848
  [4,15,-10,14.1421,-24.1421,-12,14.1421,-24.1421,-12,18.3848,-28.3848,-10,18.3848,-28.3848],
// 1 15 -10 2.828 -12.828 5 0 0 0 0.707107 -1.41421 0 0.707107 1.41421 1-4disc.dat
  [1,15,-10,2.828,-12.828,5,0,0,0,0.707107,-1.41421,0,0.707107,1.41421, ldraw_lib__1_4disc(realsolid)],
// 1 16 -10 2.828 -12.828 0 0 5 -1.41421 0.707107 0 1.41421 0.707107 0 1-4ndis.dat
  [1,16,-10,2.828,-12.828,0,0,5,-1.41421,0.707107,0,1.41421,0.707107,0, ldraw_lib__1_4ndis(realsolid)],
// 1 15 -7 2.828 -12.828 0 0 2 3.53553 0.707107 0 -3.53553 0.707107 0 1-4disc.dat
  [1,15,-7,2.828,-12.828,0,0,2,3.53553,0.707107,0,-3.53553,0.707107,0, ldraw_lib__1_4disc(realsolid)],
// 1 16 -7 2.828 -12.828 2 0 0 0 0.707107 3.53553 0 0.707107 -3.53553 1-4ndis.dat
  [1,16,-7,2.828,-12.828,2,0,0,0,0.707107,3.53553,0,0.707107,-3.53553, ldraw_lib__1_4ndis(realsolid)],
// 1 15 -7 5.657 -15.657 -3 0 0 0 0.707107 0.707107 0 0.707107 -0.707107 1-4disc.dat
  [1,15,-7,5.657,-15.657,-3,0,0,0,0.707107,0.707107,0,0.707107,-0.707107, ldraw_lib__1_4disc(realsolid)],
// 1 16 -7 5.657 -15.657 0 0 -3 0.707107 0.707107 0 -0.707107 0.707107 0 1-4ndis.dat
  [1,16,-7,5.657,-15.657,0,0,-3,0.707107,0.707107,0,-0.707107,0.707107,0, ldraw_lib__1_4ndis(realsolid)],
// 1 15 -10 16.971 -26.971 0 0 5 1.41421 0.707107 0 -1.41421 0.707107 0 1-4disc.dat
  [1,15,-10,16.971,-26.971,0,0,5,1.41421,0.707107,0,-1.41421,0.707107,0, ldraw_lib__1_4disc(realsolid)],
// 1 16 -10 16.971 -26.971 5 0 0 0 0.707107 1.41421 0 0.707107 -1.41421 1-4ndis.dat
  [1,16,-10,16.971,-26.971,5,0,0,0,0.707107,1.41421,0,0.707107,-1.41421, ldraw_lib__1_4ndis(realsolid)],
// 1 15 -7 16.971 -26.971 2 0 0 0 0.707107 -3.53553 0 0.707107 3.53553 1-4disc.dat
  [1,15,-7,16.971,-26.971,2,0,0,0,0.707107,-3.53553,0,0.707107,3.53553, ldraw_lib__1_4disc(realsolid)],
// 1 16 -7 16.971 -26.971 0 0 2 -3.53553 0.707107 0 3.53553 0.707107 0 1-4ndis.dat
  [1,16,-7,16.971,-26.971,0,0,2,-3.53553,0.707107,0,3.53553,0.707107,0, ldraw_lib__1_4ndis(realsolid)],
// 1 15 -7 14.142 -24.142 0 0 -3 -0.707107 0.707107 0 0.707107 0.707107 0 1-4disc.dat
  [1,15,-7,14.142,-24.142,0,0,-3,-0.707107,0.707107,0,0.707107,0.707107,0, ldraw_lib__1_4disc(realsolid)],
// 1 16 -7 14.142 -24.142 -3 0 0 0 0.707107 -0.707107 0 0.707107 0.707107 1-4ndis.dat
  [1,16,-7,14.142,-24.142,-3,0,0,0,0.707107,-0.707107,0,0.707107,0.707107, ldraw_lib__1_4ndis(realsolid)],
// 4 16 -11 5.65685 -15.6569 -11 14.1421 -24.1421 -10 14.1421 -24.1421 -10 5.65685 -15.6569
  [4,16,-11,5.65685,-15.6569,-11,14.1421,-24.1421,-10,14.1421,-24.1421,-10,5.65685,-15.6569],
// 4 15 -10 2.82843 -12.8284 -10 5.65685 -15.6569 -7 5.65685 -15.6569 -7 2.82843 -12.8284
  [4,15,-10,2.82843,-12.8284,-10,5.65685,-15.6569,-7,5.65685,-15.6569,-7,2.82843,-12.8284],
// 4 15 -10 14.1421 -24.1421 -10 16.9706 -26.9706 -7 16.9706 -26.9706 -7 14.1421 -24.1421
  [4,15,-10,14.1421,-24.1421,-10,16.9706,-26.9706,-7,16.9706,-26.9706,-7,14.1421,-24.1421],
// 4 16 -10 6.36396 -16.364 -10 13.435 -23.435 -5 13.435 -23.435 -5 6.36396 -16.364
  [4,16,-10,6.36396,-16.364,-10,13.435,-23.435,-5,13.435,-23.435,-5,6.36396,-16.364],
// 4 16 -10 18.3848 -28.3848 -10 20 -30 -5 20 -30 -5 18.3848 -28.3848
  [4,16,-10,18.3848,-28.3848,-10,20,-30,-5,20,-30,-5,18.3848,-28.3848],
// 4 16 -10 0 -10 -10 1.41421 -11.4142 -5 1.41421 -11.4142 -5 0 -10
  [4,16,-10,0,-10,-10,1.41421,-11.4142,-5,1.41421,-11.4142,-5,0,-10],
// 0
];
module ldraw_lib__3039p12(step=0, col=false, unit=2/5, alt=false, line=0.2, solid=!$preview)
    makepoly(ldraw_lib__3039p12(solid), step=step, col=col, unit=unit, alt=alt, line=line, solid=solid);
ldraw_lib__3039p12(line=0.2);
